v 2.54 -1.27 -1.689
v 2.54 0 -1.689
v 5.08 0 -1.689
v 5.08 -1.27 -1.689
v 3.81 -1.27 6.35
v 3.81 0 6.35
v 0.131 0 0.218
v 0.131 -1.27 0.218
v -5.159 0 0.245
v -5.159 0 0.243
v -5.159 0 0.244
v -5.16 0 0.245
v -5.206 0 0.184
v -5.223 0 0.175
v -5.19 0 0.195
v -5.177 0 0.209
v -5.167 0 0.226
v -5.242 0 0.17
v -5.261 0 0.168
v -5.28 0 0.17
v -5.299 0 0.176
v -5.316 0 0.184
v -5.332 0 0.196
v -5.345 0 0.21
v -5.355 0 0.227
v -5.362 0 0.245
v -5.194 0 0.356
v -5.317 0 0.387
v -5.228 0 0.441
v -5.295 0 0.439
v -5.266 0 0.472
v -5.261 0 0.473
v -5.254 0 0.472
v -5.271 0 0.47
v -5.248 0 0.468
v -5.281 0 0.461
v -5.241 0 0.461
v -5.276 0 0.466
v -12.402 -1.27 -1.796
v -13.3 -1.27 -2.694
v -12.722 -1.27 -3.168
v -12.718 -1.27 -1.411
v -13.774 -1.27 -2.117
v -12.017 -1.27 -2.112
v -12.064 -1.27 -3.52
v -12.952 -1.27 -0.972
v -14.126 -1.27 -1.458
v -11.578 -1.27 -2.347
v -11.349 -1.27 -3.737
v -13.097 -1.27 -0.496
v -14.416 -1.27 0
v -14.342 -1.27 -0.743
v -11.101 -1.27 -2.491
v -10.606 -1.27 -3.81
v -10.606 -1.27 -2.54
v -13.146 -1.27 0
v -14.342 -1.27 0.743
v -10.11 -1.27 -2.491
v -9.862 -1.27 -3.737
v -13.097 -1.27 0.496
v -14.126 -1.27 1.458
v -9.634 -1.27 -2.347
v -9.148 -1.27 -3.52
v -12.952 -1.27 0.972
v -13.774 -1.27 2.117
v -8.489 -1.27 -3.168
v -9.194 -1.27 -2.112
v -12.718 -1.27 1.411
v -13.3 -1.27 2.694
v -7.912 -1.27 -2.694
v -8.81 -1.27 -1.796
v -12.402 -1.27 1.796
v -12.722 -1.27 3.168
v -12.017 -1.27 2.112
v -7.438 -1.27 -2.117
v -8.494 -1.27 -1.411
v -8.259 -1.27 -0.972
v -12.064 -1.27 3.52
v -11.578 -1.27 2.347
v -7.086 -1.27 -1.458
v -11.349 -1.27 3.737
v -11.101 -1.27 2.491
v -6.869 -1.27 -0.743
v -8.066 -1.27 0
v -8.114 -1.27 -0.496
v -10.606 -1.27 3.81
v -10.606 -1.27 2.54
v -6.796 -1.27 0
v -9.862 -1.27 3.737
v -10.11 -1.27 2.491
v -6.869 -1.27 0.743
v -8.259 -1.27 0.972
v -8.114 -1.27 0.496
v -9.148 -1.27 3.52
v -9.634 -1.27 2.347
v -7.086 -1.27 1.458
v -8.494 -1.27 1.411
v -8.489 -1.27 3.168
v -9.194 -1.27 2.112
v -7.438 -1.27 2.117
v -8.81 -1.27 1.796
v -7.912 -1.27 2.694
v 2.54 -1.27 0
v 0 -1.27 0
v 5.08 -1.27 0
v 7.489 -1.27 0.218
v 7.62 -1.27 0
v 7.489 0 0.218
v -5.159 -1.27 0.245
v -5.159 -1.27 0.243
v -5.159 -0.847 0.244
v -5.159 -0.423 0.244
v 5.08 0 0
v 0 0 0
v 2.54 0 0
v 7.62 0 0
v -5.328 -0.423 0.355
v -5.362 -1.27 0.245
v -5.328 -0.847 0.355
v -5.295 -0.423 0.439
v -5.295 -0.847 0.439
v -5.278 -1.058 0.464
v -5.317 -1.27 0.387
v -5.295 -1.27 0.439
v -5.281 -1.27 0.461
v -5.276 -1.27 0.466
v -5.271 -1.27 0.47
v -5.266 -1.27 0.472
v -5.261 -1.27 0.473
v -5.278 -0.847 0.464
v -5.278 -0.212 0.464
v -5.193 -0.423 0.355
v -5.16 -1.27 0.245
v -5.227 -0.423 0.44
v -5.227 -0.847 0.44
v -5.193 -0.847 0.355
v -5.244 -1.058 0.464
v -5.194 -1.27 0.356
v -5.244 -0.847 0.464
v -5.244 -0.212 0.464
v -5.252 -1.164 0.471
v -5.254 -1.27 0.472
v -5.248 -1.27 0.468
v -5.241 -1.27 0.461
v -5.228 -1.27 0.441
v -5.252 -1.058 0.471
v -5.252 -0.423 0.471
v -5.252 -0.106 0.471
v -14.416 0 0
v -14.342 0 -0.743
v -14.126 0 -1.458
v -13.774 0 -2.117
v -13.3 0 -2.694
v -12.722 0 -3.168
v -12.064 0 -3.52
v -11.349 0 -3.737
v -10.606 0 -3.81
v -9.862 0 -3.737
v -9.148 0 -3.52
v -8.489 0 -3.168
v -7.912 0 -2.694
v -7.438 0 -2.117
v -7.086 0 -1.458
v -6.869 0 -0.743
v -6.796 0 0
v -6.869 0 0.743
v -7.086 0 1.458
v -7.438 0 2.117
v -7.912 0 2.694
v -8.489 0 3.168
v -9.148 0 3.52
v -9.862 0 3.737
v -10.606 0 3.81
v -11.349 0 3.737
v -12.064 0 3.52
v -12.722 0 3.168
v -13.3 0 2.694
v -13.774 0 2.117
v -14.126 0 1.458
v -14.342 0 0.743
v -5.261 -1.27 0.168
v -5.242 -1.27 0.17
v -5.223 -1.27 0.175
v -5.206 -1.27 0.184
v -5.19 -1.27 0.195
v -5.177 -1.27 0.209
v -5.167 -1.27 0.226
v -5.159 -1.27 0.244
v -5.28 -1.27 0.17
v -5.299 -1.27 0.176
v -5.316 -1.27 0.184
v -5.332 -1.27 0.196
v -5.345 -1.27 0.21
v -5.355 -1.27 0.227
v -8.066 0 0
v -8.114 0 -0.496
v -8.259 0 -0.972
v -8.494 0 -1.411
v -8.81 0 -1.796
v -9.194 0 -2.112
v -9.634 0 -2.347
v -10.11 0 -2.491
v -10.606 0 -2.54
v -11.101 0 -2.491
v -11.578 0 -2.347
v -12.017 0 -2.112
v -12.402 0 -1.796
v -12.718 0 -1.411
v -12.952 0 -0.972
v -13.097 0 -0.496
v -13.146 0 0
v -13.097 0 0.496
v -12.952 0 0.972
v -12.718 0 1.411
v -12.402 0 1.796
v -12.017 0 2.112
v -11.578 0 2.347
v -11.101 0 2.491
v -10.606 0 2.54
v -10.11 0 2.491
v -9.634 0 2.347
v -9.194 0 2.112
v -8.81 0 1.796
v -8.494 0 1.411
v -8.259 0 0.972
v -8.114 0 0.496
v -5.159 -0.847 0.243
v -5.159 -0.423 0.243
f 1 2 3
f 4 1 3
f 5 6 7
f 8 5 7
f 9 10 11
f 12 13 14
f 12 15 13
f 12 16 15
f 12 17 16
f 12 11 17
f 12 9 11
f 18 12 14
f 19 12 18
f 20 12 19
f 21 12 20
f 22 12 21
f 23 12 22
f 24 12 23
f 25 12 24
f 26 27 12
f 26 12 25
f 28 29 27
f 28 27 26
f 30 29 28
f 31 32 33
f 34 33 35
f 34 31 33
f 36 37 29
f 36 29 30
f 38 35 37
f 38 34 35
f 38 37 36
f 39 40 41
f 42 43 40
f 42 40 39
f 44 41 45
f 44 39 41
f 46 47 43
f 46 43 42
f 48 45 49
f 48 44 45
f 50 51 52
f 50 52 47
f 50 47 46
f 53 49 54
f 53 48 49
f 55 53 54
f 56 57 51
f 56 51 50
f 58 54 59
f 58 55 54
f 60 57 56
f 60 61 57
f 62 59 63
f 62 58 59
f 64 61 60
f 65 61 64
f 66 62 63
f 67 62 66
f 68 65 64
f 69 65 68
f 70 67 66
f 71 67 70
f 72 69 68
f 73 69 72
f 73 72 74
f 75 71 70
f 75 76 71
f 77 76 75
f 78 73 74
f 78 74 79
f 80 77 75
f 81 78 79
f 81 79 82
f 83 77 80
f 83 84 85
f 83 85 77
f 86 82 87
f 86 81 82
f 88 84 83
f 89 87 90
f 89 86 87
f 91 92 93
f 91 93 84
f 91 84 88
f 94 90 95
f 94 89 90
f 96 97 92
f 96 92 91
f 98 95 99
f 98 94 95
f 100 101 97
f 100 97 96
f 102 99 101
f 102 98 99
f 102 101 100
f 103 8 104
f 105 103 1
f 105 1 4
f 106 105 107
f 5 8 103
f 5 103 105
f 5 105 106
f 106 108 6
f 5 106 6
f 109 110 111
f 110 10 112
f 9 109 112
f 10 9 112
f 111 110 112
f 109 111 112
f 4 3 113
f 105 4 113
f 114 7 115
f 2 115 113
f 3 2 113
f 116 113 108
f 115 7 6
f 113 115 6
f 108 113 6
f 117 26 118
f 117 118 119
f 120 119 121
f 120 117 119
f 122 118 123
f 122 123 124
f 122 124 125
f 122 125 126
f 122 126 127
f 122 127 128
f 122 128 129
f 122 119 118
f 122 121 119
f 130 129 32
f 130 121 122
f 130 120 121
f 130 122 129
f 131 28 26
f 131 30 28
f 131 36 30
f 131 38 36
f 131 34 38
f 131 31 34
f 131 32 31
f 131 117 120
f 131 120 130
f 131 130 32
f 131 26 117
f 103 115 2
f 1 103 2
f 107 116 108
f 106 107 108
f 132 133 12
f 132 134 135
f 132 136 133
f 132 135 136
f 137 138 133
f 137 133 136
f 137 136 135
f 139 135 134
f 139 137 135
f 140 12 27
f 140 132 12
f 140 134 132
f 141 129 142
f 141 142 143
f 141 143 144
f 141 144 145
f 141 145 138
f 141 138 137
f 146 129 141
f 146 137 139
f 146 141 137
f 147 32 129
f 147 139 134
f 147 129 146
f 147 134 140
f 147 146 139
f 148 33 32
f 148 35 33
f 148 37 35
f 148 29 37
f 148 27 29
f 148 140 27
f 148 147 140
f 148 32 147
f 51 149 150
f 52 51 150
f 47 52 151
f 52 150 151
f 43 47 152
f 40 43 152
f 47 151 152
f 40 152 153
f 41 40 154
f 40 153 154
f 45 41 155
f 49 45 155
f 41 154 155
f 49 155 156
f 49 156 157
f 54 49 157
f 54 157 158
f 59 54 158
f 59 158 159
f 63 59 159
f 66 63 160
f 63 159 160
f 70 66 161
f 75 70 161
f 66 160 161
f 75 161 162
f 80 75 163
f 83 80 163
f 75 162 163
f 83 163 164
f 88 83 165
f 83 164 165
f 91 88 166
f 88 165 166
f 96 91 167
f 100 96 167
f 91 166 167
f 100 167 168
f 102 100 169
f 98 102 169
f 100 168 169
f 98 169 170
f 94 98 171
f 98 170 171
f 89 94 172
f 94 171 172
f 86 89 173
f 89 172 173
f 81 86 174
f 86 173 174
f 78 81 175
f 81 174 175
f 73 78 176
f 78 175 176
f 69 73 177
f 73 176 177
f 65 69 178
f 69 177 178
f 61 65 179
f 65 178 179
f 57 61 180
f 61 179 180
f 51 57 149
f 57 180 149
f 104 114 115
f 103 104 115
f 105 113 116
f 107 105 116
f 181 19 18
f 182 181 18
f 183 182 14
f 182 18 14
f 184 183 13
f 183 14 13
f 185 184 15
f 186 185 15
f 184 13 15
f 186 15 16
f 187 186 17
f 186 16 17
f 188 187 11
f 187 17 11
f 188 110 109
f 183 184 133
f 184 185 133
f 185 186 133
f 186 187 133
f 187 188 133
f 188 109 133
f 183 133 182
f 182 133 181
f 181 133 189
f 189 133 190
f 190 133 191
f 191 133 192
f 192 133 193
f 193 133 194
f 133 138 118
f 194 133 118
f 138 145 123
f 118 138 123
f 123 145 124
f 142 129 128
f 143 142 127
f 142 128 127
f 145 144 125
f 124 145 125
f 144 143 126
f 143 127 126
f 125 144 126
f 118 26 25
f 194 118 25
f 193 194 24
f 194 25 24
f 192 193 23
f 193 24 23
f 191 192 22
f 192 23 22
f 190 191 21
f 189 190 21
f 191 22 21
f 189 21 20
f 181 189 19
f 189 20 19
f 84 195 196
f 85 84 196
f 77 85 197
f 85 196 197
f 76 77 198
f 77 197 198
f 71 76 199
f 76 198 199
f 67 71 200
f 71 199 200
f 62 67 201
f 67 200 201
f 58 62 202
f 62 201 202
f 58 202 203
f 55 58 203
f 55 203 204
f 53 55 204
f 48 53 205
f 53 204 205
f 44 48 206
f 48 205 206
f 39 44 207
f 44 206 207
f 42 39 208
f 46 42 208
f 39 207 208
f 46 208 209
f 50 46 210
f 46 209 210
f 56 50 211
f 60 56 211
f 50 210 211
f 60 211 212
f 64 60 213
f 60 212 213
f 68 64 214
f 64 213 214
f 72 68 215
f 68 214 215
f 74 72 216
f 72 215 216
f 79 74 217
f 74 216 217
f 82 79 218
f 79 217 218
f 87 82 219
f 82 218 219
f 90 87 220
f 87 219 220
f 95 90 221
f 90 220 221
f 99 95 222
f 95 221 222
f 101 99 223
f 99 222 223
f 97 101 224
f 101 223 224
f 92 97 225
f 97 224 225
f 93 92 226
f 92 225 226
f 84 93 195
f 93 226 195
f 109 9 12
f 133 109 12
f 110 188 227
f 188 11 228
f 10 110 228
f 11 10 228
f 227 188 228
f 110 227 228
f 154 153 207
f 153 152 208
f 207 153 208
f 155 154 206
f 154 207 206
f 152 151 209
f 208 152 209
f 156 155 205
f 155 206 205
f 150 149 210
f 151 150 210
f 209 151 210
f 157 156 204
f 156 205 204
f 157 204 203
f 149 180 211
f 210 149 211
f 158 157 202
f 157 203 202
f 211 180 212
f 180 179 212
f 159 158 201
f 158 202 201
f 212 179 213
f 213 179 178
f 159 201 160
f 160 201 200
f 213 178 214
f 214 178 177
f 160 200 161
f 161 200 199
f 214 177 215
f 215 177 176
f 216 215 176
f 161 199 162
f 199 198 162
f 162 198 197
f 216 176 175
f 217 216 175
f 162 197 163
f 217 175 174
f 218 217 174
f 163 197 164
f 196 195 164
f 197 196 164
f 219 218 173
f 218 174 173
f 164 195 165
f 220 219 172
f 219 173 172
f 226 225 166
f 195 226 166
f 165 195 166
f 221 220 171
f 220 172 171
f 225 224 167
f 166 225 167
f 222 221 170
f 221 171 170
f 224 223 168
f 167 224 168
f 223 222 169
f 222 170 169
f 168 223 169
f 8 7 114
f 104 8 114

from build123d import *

# Parameters (mm, degrees)
F1_DEPTH = 1.27


with BuildPart() as f1:
    # F0 (on Front) → F1 (new body)
    with BuildSketch(Plane.XZ):
        with BuildLine():
            Line((0.130682, 0.217803), (0, 0))
            Line((0, 0), (0.254, 0))
            ThreePointArc((0.254, 0), (0.128855, 0.072956), (0.130682, 0.217803))
        make_face()
        with BuildLine():
            ThreePointArc((0.130682, 0.217803), (0.128855, 0.072956), (0.254, 0))
            Line((0.254, 0), (2.54, 0))
            Line((2.54, 0), (3.81, 0))
            Line((3.81, 0), (3.81, 6.35))
            Line((3.81, 6.35), (0.130682, 0.217803))
        make_face()
        Polygon((3.81, 0), (2.54, 0), (2.54, -1.688838), (5.08, -1.688838), (5.08, 0), align=None)
        with BuildLine():
            Line((7.489318, 0.217803), (3.81, 6.35))
            Line((3.81, 6.35), (3.81, 0))
            Line((3.81, 0), (5.08, 0))
            Line((5.08, 0), (7.366, 0))
            ThreePointArc((7.366, 0), (7.491145, 0.072956), (7.489318, 0.217803))
        make_face()
        with BuildLine():
            Line((7.62, 0), (7.489318, 0.217803))
            ThreePointArc((7.489318, 0.217803), (7.491145, 0.072956), (7.366, 0))
            Line((7.366, 0), (7.62, 0))
        make_face()
        with BuildLine():
            ThreePointArc((-6.795614, 0), (-10.605614, 3.81), (-14.415614, 0))
            ThreePointArc((-14.415614, 0), (-10.605614, -3.81), (-6.795614, 0))
        make_face()
        with BuildLine():
            ThreePointArc((-13.145614, 0), (-10.605614, 2.54), (-8.065614, 0))
            ThreePointArc((-8.065614, 0), (-10.605614, -2.54), (-13.145614, 0))
        make_face(mode=Mode.SUBTRACT)
        with BuildLine():
            add(Edge.make_bspline(
                [(-5.362316, 0.244631), (-5.328451, 0.358824), (-5.29447, 0.473083), (-5.260716, 0.473231)],
                knots=[0, 0, 0, 0, 0.250161, 0.250161, 0.250161, 0.250161], degree=3))
            Line((-5.362316, 0.244631), (-5.260716, 0.244631))
            Line((-5.260716, 0.244631), (-5.260716, 0.473231))
        make_face()
        with BuildLine():
            Line((-5.260716, 0.244631), (-5.362316, 0.244631))
            ThreePointArc((-5.362316, 0.244631), (-5.324216, 0.189598), (-5.260716, 0.168431))
            Line((-5.260716, 0.168431), (-5.260716, 0.244631))
        make_face()
        with BuildLine():
            Line((-5.260716, 0.473231), (-5.260716, 0.244631))
            Line((-5.260716, 0.244631), (-5.159724, 0.244631))
            add(Edge.make_bspline(
                [(-5.260716, 0.473231), (-5.226939, 0.473379), (-5.193389, 0.359263), (-5.159724, 0.244631)],
                knots=[0.250161, 0.250161, 0.250161, 0.250161, 0.500491, 0.500491, 0.500491, 0.500491], degree=3))
        make_face()
        with BuildLine():
            Line((-5.159724, 0.244631), (-5.260716, 0.244631))
            Line((-5.260716, 0.244631), (-5.260716, 0.168431))
            ThreePointArc((-5.260716, 0.168431), (-5.197646, 0.189276), (-5.159422, 0.2436))
            add(Edge.make_bspline(
                [(-5.159724, 0.244631), (-5.159624, 0.244288), (-5.159523, 0.243944), (-5.159422, 0.2436)],
                knots=[0.500491, 0.500491, 0.500491, 0.500491, 0.501241, 0.501241, 0.501241, 0.501241], degree=3))
        make_face()
        with BuildLine():
            Line((-5.159116, 0.244631), (-5.159724, 0.244631))
            add(Edge.make_bspline(
                [(-5.159724, 0.244631), (-5.159624, 0.244288), (-5.159523, 0.243944), (-5.159422, 0.2436)],
                knots=[0.500491, 0.500491, 0.500491, 0.500491, 0.501241, 0.501241, 0.501241, 0.501241], degree=3))
            ThreePointArc((-5.159422, 0.2436), (-5.159267, 0.244115), (-5.159116, 0.244631))
        make_face()
        with BuildLine():
            ThreePointArc((-5.159116, 0.244631), (-5.159267, 0.244115), (-5.159422, 0.2436))
            add(Edge.make_bspline(
                [(-5.159422, 0.2436), (-5.15939, 0.243491), (-5.159357, 0.243381), (-5.159325, 0.243272)],
                knots=[0.501241, 0.501241, 0.501241, 0.501241, 0.50148, 0.50148, 0.50148, 0.50148], degree=3))
            add(Edge.make_bspline(
                [(-5.159325, 0.243272), (-5.159255, 0.243725), (-5.159185, 0.244178), (-5.159116, 0.244631)],
                knots=[0.000688, 0.000688, 0.000688, 0.000688, 0.002063, 0.002063, 0.002063, 0.002063], degree=3))
        make_face()
    extrude(amount=F1_DEPTH)


solid = f1.part
